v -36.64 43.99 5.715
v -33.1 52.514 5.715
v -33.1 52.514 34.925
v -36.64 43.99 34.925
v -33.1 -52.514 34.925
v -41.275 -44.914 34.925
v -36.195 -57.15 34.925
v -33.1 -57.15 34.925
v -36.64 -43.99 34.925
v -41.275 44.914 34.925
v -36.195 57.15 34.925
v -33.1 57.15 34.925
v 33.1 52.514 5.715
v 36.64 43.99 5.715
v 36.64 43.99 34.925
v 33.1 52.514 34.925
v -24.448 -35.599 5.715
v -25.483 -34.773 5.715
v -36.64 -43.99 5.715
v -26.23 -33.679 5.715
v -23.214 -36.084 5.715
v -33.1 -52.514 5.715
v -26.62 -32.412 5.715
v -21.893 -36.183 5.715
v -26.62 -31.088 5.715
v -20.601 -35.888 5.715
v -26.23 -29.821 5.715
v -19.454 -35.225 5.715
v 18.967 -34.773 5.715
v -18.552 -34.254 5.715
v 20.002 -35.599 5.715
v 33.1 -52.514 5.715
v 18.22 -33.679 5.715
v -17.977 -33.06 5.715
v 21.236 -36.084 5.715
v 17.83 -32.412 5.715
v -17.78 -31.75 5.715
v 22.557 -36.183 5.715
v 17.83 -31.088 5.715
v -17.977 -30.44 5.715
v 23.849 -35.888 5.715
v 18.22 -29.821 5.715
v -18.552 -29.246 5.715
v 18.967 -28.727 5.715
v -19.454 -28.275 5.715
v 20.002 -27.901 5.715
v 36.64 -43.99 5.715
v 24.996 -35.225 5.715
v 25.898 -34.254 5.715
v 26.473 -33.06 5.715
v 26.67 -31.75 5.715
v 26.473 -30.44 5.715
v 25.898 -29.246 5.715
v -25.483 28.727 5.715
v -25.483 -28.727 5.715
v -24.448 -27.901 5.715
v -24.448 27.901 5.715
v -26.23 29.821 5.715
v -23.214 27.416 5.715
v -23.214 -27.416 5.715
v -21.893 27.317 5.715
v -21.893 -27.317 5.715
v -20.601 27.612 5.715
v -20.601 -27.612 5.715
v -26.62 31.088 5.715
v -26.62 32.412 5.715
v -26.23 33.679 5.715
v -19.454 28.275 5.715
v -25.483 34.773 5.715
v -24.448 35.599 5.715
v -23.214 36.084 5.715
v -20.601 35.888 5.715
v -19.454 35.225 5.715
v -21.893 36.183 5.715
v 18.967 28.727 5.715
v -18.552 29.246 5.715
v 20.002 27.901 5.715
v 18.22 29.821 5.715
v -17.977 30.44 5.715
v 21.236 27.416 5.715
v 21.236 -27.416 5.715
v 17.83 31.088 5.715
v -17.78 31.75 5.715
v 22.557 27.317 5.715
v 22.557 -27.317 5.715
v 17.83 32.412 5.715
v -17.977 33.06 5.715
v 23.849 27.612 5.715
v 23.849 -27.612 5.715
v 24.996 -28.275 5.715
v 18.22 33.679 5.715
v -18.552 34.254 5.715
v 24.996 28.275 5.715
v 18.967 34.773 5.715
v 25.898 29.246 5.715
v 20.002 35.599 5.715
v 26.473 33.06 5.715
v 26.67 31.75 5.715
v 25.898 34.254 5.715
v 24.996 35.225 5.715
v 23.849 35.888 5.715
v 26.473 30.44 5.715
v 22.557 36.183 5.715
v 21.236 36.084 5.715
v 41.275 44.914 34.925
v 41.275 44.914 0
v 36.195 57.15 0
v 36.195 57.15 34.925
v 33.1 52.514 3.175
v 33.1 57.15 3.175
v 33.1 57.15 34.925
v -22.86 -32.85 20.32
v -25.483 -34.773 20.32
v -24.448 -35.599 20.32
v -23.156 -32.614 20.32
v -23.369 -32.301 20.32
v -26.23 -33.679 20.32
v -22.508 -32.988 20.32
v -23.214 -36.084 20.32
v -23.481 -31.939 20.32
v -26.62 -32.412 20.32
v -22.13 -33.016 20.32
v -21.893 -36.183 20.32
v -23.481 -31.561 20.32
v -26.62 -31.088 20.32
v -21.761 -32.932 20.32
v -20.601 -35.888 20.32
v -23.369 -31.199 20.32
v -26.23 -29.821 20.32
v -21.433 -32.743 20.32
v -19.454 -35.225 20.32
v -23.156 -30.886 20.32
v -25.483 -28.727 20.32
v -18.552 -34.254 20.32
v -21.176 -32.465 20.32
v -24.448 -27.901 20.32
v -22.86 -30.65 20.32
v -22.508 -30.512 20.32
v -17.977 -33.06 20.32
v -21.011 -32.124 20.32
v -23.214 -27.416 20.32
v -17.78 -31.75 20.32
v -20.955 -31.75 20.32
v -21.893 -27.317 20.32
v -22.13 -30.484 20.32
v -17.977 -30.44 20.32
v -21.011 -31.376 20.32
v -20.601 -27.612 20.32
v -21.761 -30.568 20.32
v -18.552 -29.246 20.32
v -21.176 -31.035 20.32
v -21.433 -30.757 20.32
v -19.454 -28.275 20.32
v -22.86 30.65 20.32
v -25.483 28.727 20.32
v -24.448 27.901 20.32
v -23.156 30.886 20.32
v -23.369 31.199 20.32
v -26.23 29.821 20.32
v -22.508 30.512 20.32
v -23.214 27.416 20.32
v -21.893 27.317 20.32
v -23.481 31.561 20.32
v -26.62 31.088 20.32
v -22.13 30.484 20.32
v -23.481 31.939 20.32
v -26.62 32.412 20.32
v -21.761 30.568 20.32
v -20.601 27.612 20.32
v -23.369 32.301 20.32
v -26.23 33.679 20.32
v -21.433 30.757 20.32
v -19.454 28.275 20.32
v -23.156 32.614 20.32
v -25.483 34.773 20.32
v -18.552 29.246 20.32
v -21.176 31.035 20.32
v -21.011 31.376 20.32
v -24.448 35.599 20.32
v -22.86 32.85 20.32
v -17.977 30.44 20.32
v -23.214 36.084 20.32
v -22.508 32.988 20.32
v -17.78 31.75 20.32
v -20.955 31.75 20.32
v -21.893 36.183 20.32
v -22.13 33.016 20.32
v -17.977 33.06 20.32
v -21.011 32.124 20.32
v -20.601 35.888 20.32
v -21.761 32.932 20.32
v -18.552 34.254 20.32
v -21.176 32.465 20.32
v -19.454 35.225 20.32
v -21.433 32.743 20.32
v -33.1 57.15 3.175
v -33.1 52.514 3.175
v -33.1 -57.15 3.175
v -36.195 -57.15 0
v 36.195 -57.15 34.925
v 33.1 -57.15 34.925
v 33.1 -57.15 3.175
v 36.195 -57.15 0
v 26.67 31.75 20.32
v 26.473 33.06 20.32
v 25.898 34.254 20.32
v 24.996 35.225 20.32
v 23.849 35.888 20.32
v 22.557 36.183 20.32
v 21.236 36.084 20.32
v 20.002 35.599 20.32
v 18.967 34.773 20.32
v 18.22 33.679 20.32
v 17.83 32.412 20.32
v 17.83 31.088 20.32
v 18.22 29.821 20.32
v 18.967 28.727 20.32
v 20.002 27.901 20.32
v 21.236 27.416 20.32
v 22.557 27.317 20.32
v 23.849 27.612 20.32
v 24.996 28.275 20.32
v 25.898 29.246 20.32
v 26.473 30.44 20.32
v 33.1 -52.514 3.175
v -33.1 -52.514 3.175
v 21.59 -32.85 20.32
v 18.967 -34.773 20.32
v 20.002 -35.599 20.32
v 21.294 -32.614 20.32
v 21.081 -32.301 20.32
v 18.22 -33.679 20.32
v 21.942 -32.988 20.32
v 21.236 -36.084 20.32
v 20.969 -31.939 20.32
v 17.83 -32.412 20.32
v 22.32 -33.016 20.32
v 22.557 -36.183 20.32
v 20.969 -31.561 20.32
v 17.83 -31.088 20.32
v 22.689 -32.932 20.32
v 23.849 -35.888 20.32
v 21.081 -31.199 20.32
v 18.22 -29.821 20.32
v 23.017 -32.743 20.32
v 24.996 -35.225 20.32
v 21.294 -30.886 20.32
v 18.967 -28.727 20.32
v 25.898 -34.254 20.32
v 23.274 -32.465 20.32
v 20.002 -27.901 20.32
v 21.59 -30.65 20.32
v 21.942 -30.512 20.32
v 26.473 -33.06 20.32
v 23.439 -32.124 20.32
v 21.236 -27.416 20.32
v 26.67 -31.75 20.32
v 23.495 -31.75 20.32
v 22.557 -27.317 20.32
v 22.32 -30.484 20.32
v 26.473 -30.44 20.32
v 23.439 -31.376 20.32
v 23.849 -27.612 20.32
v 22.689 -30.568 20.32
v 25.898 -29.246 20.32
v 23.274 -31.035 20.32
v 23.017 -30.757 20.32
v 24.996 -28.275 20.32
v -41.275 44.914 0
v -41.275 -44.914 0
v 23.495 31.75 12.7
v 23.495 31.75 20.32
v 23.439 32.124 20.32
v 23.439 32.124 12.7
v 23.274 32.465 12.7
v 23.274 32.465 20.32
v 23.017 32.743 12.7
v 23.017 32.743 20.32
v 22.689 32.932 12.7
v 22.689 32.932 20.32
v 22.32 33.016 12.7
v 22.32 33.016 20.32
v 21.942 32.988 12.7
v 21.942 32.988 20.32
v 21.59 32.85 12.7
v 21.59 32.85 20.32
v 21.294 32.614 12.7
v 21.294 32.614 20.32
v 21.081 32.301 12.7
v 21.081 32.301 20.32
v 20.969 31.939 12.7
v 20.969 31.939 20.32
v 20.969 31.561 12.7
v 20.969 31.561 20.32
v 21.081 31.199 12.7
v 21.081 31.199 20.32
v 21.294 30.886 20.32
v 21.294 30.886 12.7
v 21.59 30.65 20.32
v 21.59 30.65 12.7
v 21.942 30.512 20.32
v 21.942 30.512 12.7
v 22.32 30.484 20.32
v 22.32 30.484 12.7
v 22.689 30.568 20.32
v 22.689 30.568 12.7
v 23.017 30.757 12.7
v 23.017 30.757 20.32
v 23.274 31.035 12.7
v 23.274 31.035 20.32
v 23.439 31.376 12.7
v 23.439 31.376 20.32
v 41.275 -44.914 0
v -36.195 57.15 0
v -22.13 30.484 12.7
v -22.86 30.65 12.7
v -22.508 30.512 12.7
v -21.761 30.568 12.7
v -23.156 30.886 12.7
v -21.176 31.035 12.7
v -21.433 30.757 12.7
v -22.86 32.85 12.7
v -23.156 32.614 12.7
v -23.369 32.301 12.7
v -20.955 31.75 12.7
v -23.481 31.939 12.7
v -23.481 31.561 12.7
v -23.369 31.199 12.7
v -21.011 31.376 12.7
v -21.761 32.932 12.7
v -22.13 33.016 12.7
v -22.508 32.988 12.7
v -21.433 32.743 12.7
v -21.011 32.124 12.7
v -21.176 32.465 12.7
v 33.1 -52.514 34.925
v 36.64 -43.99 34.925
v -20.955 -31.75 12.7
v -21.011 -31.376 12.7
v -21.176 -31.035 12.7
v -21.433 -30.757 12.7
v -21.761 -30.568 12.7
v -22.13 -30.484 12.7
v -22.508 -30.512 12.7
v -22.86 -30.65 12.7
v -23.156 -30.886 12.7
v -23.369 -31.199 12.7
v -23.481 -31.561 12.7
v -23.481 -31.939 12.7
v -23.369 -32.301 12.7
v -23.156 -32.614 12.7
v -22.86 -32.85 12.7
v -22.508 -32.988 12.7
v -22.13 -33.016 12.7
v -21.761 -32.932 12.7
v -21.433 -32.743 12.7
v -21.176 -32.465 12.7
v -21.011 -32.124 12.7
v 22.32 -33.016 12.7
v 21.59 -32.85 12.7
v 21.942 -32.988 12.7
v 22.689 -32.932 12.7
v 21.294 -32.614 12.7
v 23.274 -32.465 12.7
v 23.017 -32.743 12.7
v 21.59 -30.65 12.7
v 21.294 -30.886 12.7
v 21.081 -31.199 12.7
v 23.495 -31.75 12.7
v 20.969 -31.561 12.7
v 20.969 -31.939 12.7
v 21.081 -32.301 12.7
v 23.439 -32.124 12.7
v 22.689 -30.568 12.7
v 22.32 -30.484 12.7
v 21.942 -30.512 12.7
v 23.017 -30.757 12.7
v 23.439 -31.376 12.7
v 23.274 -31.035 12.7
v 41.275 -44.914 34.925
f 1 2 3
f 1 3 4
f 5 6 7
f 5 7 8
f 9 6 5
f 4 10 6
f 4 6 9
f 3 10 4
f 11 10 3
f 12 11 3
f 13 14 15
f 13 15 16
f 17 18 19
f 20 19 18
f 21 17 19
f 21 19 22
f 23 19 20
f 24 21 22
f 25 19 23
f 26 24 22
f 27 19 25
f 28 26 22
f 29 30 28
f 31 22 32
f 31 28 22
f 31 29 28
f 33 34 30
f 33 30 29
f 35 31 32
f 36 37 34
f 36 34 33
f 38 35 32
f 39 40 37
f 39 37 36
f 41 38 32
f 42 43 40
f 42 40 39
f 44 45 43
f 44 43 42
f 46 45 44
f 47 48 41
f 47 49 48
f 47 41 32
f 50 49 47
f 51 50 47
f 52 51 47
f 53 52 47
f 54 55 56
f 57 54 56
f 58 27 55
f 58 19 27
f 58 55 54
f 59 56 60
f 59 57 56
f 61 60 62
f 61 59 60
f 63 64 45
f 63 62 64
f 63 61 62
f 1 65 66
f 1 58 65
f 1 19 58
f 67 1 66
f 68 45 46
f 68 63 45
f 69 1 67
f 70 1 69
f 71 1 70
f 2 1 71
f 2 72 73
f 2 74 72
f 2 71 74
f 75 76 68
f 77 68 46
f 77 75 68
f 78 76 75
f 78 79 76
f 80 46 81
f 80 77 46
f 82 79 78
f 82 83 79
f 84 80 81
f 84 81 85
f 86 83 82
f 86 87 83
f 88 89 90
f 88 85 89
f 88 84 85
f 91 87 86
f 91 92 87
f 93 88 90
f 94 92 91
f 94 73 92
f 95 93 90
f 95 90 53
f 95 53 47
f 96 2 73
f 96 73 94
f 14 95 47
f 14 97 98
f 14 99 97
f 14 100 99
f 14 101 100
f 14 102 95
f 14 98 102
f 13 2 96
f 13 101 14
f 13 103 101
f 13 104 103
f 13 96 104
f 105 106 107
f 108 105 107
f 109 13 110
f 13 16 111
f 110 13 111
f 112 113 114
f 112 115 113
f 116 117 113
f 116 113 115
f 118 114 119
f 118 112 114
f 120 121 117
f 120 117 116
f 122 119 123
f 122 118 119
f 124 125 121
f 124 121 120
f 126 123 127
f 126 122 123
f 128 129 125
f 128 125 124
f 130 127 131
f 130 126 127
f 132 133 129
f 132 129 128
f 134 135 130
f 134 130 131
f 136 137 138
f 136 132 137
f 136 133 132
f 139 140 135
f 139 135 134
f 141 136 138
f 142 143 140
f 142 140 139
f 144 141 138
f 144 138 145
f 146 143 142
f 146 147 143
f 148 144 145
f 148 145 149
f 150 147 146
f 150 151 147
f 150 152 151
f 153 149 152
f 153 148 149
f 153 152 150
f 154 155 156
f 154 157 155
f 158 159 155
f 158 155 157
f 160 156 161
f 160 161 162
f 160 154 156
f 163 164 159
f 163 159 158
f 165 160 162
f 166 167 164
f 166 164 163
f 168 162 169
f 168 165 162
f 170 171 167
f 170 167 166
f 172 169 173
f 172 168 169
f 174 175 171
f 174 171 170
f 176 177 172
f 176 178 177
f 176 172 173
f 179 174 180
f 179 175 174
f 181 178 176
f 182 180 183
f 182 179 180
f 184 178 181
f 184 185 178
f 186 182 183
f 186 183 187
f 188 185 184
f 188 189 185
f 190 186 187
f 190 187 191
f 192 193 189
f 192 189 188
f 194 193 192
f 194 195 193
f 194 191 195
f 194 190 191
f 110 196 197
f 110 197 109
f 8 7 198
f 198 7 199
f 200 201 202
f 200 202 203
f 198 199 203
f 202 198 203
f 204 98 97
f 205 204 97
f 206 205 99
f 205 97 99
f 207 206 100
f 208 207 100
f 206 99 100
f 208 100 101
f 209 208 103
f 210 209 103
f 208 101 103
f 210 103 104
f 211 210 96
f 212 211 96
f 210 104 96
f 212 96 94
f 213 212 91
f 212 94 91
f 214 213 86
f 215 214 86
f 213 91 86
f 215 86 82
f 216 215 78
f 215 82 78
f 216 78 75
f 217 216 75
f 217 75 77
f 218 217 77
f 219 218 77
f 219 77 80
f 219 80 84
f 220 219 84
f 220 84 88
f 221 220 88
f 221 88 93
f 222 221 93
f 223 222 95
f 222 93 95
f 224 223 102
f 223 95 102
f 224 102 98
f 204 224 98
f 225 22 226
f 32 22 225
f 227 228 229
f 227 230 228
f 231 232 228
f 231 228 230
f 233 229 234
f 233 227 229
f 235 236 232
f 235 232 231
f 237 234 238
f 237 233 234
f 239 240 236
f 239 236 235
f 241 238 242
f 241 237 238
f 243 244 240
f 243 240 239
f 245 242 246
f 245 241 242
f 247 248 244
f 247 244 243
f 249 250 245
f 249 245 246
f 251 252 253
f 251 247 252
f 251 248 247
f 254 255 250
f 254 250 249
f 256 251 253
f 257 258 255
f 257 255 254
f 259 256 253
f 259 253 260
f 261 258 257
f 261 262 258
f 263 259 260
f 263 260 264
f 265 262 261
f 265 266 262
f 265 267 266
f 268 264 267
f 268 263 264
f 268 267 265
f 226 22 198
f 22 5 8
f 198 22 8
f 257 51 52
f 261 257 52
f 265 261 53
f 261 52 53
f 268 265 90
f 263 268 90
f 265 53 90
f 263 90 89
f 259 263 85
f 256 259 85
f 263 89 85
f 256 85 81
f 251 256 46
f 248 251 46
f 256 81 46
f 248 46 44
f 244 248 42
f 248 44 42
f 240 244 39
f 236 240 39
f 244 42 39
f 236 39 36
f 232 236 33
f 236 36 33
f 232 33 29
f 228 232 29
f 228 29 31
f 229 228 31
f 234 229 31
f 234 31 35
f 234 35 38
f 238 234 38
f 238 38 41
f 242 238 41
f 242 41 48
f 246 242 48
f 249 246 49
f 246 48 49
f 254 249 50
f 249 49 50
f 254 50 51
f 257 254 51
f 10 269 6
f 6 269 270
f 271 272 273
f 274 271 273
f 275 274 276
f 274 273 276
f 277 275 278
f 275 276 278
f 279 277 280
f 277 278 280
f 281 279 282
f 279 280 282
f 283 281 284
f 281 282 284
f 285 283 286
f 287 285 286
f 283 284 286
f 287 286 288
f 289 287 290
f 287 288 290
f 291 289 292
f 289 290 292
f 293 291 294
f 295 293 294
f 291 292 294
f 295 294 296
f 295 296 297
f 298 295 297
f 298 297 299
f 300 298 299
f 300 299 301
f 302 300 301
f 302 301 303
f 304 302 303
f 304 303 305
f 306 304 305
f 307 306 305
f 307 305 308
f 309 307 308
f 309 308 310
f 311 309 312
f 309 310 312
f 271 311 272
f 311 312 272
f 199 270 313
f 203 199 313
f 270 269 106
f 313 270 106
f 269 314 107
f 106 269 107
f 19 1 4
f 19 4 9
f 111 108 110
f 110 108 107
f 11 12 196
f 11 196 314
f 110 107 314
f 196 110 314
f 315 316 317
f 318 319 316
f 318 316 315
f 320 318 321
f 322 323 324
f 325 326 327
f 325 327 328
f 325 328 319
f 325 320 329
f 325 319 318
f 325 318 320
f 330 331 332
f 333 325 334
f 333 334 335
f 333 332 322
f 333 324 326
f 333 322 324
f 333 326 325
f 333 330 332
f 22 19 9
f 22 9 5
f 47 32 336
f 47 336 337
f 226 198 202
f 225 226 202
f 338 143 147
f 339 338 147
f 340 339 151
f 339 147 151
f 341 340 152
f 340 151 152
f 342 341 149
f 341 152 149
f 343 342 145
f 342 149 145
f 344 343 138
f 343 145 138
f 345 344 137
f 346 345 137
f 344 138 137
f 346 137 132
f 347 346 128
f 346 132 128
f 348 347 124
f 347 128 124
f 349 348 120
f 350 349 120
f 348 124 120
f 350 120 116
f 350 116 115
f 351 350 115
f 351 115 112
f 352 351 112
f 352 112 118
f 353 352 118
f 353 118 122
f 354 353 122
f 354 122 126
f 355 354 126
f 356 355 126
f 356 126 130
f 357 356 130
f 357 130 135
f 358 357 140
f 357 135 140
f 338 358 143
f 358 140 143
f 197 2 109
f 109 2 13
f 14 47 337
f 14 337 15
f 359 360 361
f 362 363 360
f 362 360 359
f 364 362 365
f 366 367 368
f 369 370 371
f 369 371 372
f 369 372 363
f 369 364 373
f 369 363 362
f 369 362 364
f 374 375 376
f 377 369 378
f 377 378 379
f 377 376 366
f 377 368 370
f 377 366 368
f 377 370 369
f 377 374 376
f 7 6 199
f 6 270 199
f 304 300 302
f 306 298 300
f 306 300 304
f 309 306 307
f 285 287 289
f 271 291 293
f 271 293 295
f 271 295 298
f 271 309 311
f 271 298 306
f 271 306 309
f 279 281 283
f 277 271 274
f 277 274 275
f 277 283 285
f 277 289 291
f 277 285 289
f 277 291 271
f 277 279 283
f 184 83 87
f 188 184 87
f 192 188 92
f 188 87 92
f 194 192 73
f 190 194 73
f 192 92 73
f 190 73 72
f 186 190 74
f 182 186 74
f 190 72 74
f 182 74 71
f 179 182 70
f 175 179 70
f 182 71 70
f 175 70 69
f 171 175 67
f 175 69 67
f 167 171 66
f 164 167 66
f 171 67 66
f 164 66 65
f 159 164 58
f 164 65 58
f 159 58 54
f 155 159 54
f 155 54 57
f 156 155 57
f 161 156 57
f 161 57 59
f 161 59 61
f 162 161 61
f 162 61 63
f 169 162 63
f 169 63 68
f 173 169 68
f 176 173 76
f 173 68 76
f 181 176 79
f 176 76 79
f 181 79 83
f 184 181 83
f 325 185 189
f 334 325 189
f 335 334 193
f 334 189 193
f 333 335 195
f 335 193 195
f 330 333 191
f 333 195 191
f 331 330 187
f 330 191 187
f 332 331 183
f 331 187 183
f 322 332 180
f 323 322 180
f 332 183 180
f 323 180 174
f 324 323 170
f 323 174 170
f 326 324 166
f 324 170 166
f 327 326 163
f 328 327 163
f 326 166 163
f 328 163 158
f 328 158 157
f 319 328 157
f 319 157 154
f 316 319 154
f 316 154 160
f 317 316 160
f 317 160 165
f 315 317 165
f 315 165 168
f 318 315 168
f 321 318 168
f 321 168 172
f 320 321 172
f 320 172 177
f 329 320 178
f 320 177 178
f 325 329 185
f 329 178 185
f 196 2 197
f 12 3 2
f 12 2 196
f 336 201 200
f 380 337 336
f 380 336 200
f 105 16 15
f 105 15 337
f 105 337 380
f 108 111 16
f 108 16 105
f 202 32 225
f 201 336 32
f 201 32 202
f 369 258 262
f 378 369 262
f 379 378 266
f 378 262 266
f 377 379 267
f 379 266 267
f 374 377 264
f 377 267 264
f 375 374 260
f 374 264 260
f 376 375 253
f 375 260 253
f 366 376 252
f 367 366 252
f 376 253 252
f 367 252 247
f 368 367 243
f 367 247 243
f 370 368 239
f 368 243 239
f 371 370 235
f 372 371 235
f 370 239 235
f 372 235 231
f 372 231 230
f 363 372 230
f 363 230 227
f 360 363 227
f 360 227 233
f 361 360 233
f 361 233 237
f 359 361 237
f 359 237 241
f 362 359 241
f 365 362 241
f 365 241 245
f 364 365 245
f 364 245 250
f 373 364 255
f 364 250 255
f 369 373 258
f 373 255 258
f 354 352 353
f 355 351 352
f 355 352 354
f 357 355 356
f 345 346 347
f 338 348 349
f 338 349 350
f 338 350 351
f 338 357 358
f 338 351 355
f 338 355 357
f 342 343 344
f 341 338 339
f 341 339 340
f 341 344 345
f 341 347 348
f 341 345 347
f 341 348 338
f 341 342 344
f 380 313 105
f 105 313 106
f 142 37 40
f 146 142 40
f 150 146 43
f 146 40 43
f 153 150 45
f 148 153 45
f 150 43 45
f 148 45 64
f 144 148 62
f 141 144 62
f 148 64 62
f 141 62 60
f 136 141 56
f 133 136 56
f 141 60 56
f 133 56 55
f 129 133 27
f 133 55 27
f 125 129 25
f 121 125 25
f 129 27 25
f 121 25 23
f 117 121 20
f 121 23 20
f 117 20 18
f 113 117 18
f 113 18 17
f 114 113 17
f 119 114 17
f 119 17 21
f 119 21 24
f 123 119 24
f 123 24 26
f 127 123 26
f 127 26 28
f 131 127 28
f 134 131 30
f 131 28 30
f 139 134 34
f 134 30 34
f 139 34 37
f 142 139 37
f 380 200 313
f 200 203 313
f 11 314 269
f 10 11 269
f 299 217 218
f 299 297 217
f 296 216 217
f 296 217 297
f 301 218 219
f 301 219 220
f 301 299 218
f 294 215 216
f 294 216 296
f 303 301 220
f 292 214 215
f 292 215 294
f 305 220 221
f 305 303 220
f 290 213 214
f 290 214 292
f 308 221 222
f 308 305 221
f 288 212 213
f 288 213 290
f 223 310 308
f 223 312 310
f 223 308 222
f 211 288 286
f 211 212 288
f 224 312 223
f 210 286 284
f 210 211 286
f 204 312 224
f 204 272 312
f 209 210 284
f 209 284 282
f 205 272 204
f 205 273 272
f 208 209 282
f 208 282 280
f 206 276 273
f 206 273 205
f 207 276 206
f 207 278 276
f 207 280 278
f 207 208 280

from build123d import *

# Parameters (mm, degrees)
BOSS_EXTRUDE1_DEPTH = 5.715
BOSS_EXTRUDE2_DEPTH = 29.21
SKETCH3_W           = 66.200858932
SKETCH3_H           = 4.6355
CUT_EXTRUDE1_DEPTH  = 31.75
SKETCH4_R           = 4.445
BOSS_EXTRUDE3_DEPTH = 14.605
SKETCH5_R           = 1.27
CUT_EXTRUDE2_DEPTH  = 7.62


with BuildPart() as part:
    # Sketch1 → Boss-Extrude1 (new body)
    with BuildSketch(Plane.XY):
        Polygon((41.275, 44.914422768), (36.195, 57.15), (-36.195, 57.15), (-41.275, 44.914422768), (-41.275, -44.914422768), (-36.195, -57.15), (36.195, -57.15), (41.275, -44.914422768), align=None)
    extrude(amount=BOSS_EXTRUDE1_DEPTH)

    # Sketch2 → Boss-Extrude2 (add)
    with BuildSketch(Plane.XY.offset(5.715)):
        Polygon((-41.275, 44.914422768), (-41.275, -44.914422768), (-36.195, -57.15), (36.195, -57.15), (41.275, -44.914422768), (41.275, 44.914422768), (36.195, 57.15), (-36.195, 57.15), align=None)
        Polygon((-33.100429466, 52.5145), (-36.6395, 43.99037188), (-36.6395, -43.99037188), (-33.100429466, -52.5145), (33.100429466, -52.5145), (36.6395, -43.99037188), (36.6395, 43.99037188), (33.100429466, 52.5145), align=None, mode=Mode.SUBTRACT)
    extrude(amount=BOSS_EXTRUDE2_DEPTH)

    # Sketch3 → Cut-Extrude1 (cut)
    with BuildSketch(Plane.XY.offset(34.925)):
        with Locations((0, 54.83225)):
            Rectangle(SKETCH3_W, SKETCH3_H)
    cut_extrude1 = extrude(amount=-CUT_EXTRUDE1_DEPTH, mode=Mode.SUBTRACT)

    # Mirror1: Cut-Extrude1 across plane
    add(cut_extrude1.mirror(Plane.ZX), mode=Mode.SUBTRACT)

    # Sketch4 → Boss-Extrude3 (add)
    with BuildSketch(Plane.XY.offset(5.715)):
        with Locations((22.225, -31.75)):
            Circle(SKETCH4_R)
        with Locations((-22.225, -31.75)):
            Circle(SKETCH4_R)
        with Locations((22.225, 31.75)):
            Circle(SKETCH4_R)
        with Locations((-22.225, 31.75)):
            Circle(SKETCH4_R)
    extrude(amount=BOSS_EXTRUDE3_DEPTH)

    # Sketch5 → Cut-Extrude2 (cut)
    with BuildSketch(Plane.XY.offset(20.32)):
        with Locations((-22.225, 31.75)):
            Circle(SKETCH5_R)
        with Locations((22.225, 31.75)):
            Circle(SKETCH5_R)
        with Locations((22.225, -31.75)):
            Circle(SKETCH5_R)
        with Locations((-22.225, -31.75)):
            Circle(SKETCH5_R)
    extrude(amount=-CUT_EXTRUDE2_DEPTH, mode=Mode.SUBTRACT)


solid = part.part
